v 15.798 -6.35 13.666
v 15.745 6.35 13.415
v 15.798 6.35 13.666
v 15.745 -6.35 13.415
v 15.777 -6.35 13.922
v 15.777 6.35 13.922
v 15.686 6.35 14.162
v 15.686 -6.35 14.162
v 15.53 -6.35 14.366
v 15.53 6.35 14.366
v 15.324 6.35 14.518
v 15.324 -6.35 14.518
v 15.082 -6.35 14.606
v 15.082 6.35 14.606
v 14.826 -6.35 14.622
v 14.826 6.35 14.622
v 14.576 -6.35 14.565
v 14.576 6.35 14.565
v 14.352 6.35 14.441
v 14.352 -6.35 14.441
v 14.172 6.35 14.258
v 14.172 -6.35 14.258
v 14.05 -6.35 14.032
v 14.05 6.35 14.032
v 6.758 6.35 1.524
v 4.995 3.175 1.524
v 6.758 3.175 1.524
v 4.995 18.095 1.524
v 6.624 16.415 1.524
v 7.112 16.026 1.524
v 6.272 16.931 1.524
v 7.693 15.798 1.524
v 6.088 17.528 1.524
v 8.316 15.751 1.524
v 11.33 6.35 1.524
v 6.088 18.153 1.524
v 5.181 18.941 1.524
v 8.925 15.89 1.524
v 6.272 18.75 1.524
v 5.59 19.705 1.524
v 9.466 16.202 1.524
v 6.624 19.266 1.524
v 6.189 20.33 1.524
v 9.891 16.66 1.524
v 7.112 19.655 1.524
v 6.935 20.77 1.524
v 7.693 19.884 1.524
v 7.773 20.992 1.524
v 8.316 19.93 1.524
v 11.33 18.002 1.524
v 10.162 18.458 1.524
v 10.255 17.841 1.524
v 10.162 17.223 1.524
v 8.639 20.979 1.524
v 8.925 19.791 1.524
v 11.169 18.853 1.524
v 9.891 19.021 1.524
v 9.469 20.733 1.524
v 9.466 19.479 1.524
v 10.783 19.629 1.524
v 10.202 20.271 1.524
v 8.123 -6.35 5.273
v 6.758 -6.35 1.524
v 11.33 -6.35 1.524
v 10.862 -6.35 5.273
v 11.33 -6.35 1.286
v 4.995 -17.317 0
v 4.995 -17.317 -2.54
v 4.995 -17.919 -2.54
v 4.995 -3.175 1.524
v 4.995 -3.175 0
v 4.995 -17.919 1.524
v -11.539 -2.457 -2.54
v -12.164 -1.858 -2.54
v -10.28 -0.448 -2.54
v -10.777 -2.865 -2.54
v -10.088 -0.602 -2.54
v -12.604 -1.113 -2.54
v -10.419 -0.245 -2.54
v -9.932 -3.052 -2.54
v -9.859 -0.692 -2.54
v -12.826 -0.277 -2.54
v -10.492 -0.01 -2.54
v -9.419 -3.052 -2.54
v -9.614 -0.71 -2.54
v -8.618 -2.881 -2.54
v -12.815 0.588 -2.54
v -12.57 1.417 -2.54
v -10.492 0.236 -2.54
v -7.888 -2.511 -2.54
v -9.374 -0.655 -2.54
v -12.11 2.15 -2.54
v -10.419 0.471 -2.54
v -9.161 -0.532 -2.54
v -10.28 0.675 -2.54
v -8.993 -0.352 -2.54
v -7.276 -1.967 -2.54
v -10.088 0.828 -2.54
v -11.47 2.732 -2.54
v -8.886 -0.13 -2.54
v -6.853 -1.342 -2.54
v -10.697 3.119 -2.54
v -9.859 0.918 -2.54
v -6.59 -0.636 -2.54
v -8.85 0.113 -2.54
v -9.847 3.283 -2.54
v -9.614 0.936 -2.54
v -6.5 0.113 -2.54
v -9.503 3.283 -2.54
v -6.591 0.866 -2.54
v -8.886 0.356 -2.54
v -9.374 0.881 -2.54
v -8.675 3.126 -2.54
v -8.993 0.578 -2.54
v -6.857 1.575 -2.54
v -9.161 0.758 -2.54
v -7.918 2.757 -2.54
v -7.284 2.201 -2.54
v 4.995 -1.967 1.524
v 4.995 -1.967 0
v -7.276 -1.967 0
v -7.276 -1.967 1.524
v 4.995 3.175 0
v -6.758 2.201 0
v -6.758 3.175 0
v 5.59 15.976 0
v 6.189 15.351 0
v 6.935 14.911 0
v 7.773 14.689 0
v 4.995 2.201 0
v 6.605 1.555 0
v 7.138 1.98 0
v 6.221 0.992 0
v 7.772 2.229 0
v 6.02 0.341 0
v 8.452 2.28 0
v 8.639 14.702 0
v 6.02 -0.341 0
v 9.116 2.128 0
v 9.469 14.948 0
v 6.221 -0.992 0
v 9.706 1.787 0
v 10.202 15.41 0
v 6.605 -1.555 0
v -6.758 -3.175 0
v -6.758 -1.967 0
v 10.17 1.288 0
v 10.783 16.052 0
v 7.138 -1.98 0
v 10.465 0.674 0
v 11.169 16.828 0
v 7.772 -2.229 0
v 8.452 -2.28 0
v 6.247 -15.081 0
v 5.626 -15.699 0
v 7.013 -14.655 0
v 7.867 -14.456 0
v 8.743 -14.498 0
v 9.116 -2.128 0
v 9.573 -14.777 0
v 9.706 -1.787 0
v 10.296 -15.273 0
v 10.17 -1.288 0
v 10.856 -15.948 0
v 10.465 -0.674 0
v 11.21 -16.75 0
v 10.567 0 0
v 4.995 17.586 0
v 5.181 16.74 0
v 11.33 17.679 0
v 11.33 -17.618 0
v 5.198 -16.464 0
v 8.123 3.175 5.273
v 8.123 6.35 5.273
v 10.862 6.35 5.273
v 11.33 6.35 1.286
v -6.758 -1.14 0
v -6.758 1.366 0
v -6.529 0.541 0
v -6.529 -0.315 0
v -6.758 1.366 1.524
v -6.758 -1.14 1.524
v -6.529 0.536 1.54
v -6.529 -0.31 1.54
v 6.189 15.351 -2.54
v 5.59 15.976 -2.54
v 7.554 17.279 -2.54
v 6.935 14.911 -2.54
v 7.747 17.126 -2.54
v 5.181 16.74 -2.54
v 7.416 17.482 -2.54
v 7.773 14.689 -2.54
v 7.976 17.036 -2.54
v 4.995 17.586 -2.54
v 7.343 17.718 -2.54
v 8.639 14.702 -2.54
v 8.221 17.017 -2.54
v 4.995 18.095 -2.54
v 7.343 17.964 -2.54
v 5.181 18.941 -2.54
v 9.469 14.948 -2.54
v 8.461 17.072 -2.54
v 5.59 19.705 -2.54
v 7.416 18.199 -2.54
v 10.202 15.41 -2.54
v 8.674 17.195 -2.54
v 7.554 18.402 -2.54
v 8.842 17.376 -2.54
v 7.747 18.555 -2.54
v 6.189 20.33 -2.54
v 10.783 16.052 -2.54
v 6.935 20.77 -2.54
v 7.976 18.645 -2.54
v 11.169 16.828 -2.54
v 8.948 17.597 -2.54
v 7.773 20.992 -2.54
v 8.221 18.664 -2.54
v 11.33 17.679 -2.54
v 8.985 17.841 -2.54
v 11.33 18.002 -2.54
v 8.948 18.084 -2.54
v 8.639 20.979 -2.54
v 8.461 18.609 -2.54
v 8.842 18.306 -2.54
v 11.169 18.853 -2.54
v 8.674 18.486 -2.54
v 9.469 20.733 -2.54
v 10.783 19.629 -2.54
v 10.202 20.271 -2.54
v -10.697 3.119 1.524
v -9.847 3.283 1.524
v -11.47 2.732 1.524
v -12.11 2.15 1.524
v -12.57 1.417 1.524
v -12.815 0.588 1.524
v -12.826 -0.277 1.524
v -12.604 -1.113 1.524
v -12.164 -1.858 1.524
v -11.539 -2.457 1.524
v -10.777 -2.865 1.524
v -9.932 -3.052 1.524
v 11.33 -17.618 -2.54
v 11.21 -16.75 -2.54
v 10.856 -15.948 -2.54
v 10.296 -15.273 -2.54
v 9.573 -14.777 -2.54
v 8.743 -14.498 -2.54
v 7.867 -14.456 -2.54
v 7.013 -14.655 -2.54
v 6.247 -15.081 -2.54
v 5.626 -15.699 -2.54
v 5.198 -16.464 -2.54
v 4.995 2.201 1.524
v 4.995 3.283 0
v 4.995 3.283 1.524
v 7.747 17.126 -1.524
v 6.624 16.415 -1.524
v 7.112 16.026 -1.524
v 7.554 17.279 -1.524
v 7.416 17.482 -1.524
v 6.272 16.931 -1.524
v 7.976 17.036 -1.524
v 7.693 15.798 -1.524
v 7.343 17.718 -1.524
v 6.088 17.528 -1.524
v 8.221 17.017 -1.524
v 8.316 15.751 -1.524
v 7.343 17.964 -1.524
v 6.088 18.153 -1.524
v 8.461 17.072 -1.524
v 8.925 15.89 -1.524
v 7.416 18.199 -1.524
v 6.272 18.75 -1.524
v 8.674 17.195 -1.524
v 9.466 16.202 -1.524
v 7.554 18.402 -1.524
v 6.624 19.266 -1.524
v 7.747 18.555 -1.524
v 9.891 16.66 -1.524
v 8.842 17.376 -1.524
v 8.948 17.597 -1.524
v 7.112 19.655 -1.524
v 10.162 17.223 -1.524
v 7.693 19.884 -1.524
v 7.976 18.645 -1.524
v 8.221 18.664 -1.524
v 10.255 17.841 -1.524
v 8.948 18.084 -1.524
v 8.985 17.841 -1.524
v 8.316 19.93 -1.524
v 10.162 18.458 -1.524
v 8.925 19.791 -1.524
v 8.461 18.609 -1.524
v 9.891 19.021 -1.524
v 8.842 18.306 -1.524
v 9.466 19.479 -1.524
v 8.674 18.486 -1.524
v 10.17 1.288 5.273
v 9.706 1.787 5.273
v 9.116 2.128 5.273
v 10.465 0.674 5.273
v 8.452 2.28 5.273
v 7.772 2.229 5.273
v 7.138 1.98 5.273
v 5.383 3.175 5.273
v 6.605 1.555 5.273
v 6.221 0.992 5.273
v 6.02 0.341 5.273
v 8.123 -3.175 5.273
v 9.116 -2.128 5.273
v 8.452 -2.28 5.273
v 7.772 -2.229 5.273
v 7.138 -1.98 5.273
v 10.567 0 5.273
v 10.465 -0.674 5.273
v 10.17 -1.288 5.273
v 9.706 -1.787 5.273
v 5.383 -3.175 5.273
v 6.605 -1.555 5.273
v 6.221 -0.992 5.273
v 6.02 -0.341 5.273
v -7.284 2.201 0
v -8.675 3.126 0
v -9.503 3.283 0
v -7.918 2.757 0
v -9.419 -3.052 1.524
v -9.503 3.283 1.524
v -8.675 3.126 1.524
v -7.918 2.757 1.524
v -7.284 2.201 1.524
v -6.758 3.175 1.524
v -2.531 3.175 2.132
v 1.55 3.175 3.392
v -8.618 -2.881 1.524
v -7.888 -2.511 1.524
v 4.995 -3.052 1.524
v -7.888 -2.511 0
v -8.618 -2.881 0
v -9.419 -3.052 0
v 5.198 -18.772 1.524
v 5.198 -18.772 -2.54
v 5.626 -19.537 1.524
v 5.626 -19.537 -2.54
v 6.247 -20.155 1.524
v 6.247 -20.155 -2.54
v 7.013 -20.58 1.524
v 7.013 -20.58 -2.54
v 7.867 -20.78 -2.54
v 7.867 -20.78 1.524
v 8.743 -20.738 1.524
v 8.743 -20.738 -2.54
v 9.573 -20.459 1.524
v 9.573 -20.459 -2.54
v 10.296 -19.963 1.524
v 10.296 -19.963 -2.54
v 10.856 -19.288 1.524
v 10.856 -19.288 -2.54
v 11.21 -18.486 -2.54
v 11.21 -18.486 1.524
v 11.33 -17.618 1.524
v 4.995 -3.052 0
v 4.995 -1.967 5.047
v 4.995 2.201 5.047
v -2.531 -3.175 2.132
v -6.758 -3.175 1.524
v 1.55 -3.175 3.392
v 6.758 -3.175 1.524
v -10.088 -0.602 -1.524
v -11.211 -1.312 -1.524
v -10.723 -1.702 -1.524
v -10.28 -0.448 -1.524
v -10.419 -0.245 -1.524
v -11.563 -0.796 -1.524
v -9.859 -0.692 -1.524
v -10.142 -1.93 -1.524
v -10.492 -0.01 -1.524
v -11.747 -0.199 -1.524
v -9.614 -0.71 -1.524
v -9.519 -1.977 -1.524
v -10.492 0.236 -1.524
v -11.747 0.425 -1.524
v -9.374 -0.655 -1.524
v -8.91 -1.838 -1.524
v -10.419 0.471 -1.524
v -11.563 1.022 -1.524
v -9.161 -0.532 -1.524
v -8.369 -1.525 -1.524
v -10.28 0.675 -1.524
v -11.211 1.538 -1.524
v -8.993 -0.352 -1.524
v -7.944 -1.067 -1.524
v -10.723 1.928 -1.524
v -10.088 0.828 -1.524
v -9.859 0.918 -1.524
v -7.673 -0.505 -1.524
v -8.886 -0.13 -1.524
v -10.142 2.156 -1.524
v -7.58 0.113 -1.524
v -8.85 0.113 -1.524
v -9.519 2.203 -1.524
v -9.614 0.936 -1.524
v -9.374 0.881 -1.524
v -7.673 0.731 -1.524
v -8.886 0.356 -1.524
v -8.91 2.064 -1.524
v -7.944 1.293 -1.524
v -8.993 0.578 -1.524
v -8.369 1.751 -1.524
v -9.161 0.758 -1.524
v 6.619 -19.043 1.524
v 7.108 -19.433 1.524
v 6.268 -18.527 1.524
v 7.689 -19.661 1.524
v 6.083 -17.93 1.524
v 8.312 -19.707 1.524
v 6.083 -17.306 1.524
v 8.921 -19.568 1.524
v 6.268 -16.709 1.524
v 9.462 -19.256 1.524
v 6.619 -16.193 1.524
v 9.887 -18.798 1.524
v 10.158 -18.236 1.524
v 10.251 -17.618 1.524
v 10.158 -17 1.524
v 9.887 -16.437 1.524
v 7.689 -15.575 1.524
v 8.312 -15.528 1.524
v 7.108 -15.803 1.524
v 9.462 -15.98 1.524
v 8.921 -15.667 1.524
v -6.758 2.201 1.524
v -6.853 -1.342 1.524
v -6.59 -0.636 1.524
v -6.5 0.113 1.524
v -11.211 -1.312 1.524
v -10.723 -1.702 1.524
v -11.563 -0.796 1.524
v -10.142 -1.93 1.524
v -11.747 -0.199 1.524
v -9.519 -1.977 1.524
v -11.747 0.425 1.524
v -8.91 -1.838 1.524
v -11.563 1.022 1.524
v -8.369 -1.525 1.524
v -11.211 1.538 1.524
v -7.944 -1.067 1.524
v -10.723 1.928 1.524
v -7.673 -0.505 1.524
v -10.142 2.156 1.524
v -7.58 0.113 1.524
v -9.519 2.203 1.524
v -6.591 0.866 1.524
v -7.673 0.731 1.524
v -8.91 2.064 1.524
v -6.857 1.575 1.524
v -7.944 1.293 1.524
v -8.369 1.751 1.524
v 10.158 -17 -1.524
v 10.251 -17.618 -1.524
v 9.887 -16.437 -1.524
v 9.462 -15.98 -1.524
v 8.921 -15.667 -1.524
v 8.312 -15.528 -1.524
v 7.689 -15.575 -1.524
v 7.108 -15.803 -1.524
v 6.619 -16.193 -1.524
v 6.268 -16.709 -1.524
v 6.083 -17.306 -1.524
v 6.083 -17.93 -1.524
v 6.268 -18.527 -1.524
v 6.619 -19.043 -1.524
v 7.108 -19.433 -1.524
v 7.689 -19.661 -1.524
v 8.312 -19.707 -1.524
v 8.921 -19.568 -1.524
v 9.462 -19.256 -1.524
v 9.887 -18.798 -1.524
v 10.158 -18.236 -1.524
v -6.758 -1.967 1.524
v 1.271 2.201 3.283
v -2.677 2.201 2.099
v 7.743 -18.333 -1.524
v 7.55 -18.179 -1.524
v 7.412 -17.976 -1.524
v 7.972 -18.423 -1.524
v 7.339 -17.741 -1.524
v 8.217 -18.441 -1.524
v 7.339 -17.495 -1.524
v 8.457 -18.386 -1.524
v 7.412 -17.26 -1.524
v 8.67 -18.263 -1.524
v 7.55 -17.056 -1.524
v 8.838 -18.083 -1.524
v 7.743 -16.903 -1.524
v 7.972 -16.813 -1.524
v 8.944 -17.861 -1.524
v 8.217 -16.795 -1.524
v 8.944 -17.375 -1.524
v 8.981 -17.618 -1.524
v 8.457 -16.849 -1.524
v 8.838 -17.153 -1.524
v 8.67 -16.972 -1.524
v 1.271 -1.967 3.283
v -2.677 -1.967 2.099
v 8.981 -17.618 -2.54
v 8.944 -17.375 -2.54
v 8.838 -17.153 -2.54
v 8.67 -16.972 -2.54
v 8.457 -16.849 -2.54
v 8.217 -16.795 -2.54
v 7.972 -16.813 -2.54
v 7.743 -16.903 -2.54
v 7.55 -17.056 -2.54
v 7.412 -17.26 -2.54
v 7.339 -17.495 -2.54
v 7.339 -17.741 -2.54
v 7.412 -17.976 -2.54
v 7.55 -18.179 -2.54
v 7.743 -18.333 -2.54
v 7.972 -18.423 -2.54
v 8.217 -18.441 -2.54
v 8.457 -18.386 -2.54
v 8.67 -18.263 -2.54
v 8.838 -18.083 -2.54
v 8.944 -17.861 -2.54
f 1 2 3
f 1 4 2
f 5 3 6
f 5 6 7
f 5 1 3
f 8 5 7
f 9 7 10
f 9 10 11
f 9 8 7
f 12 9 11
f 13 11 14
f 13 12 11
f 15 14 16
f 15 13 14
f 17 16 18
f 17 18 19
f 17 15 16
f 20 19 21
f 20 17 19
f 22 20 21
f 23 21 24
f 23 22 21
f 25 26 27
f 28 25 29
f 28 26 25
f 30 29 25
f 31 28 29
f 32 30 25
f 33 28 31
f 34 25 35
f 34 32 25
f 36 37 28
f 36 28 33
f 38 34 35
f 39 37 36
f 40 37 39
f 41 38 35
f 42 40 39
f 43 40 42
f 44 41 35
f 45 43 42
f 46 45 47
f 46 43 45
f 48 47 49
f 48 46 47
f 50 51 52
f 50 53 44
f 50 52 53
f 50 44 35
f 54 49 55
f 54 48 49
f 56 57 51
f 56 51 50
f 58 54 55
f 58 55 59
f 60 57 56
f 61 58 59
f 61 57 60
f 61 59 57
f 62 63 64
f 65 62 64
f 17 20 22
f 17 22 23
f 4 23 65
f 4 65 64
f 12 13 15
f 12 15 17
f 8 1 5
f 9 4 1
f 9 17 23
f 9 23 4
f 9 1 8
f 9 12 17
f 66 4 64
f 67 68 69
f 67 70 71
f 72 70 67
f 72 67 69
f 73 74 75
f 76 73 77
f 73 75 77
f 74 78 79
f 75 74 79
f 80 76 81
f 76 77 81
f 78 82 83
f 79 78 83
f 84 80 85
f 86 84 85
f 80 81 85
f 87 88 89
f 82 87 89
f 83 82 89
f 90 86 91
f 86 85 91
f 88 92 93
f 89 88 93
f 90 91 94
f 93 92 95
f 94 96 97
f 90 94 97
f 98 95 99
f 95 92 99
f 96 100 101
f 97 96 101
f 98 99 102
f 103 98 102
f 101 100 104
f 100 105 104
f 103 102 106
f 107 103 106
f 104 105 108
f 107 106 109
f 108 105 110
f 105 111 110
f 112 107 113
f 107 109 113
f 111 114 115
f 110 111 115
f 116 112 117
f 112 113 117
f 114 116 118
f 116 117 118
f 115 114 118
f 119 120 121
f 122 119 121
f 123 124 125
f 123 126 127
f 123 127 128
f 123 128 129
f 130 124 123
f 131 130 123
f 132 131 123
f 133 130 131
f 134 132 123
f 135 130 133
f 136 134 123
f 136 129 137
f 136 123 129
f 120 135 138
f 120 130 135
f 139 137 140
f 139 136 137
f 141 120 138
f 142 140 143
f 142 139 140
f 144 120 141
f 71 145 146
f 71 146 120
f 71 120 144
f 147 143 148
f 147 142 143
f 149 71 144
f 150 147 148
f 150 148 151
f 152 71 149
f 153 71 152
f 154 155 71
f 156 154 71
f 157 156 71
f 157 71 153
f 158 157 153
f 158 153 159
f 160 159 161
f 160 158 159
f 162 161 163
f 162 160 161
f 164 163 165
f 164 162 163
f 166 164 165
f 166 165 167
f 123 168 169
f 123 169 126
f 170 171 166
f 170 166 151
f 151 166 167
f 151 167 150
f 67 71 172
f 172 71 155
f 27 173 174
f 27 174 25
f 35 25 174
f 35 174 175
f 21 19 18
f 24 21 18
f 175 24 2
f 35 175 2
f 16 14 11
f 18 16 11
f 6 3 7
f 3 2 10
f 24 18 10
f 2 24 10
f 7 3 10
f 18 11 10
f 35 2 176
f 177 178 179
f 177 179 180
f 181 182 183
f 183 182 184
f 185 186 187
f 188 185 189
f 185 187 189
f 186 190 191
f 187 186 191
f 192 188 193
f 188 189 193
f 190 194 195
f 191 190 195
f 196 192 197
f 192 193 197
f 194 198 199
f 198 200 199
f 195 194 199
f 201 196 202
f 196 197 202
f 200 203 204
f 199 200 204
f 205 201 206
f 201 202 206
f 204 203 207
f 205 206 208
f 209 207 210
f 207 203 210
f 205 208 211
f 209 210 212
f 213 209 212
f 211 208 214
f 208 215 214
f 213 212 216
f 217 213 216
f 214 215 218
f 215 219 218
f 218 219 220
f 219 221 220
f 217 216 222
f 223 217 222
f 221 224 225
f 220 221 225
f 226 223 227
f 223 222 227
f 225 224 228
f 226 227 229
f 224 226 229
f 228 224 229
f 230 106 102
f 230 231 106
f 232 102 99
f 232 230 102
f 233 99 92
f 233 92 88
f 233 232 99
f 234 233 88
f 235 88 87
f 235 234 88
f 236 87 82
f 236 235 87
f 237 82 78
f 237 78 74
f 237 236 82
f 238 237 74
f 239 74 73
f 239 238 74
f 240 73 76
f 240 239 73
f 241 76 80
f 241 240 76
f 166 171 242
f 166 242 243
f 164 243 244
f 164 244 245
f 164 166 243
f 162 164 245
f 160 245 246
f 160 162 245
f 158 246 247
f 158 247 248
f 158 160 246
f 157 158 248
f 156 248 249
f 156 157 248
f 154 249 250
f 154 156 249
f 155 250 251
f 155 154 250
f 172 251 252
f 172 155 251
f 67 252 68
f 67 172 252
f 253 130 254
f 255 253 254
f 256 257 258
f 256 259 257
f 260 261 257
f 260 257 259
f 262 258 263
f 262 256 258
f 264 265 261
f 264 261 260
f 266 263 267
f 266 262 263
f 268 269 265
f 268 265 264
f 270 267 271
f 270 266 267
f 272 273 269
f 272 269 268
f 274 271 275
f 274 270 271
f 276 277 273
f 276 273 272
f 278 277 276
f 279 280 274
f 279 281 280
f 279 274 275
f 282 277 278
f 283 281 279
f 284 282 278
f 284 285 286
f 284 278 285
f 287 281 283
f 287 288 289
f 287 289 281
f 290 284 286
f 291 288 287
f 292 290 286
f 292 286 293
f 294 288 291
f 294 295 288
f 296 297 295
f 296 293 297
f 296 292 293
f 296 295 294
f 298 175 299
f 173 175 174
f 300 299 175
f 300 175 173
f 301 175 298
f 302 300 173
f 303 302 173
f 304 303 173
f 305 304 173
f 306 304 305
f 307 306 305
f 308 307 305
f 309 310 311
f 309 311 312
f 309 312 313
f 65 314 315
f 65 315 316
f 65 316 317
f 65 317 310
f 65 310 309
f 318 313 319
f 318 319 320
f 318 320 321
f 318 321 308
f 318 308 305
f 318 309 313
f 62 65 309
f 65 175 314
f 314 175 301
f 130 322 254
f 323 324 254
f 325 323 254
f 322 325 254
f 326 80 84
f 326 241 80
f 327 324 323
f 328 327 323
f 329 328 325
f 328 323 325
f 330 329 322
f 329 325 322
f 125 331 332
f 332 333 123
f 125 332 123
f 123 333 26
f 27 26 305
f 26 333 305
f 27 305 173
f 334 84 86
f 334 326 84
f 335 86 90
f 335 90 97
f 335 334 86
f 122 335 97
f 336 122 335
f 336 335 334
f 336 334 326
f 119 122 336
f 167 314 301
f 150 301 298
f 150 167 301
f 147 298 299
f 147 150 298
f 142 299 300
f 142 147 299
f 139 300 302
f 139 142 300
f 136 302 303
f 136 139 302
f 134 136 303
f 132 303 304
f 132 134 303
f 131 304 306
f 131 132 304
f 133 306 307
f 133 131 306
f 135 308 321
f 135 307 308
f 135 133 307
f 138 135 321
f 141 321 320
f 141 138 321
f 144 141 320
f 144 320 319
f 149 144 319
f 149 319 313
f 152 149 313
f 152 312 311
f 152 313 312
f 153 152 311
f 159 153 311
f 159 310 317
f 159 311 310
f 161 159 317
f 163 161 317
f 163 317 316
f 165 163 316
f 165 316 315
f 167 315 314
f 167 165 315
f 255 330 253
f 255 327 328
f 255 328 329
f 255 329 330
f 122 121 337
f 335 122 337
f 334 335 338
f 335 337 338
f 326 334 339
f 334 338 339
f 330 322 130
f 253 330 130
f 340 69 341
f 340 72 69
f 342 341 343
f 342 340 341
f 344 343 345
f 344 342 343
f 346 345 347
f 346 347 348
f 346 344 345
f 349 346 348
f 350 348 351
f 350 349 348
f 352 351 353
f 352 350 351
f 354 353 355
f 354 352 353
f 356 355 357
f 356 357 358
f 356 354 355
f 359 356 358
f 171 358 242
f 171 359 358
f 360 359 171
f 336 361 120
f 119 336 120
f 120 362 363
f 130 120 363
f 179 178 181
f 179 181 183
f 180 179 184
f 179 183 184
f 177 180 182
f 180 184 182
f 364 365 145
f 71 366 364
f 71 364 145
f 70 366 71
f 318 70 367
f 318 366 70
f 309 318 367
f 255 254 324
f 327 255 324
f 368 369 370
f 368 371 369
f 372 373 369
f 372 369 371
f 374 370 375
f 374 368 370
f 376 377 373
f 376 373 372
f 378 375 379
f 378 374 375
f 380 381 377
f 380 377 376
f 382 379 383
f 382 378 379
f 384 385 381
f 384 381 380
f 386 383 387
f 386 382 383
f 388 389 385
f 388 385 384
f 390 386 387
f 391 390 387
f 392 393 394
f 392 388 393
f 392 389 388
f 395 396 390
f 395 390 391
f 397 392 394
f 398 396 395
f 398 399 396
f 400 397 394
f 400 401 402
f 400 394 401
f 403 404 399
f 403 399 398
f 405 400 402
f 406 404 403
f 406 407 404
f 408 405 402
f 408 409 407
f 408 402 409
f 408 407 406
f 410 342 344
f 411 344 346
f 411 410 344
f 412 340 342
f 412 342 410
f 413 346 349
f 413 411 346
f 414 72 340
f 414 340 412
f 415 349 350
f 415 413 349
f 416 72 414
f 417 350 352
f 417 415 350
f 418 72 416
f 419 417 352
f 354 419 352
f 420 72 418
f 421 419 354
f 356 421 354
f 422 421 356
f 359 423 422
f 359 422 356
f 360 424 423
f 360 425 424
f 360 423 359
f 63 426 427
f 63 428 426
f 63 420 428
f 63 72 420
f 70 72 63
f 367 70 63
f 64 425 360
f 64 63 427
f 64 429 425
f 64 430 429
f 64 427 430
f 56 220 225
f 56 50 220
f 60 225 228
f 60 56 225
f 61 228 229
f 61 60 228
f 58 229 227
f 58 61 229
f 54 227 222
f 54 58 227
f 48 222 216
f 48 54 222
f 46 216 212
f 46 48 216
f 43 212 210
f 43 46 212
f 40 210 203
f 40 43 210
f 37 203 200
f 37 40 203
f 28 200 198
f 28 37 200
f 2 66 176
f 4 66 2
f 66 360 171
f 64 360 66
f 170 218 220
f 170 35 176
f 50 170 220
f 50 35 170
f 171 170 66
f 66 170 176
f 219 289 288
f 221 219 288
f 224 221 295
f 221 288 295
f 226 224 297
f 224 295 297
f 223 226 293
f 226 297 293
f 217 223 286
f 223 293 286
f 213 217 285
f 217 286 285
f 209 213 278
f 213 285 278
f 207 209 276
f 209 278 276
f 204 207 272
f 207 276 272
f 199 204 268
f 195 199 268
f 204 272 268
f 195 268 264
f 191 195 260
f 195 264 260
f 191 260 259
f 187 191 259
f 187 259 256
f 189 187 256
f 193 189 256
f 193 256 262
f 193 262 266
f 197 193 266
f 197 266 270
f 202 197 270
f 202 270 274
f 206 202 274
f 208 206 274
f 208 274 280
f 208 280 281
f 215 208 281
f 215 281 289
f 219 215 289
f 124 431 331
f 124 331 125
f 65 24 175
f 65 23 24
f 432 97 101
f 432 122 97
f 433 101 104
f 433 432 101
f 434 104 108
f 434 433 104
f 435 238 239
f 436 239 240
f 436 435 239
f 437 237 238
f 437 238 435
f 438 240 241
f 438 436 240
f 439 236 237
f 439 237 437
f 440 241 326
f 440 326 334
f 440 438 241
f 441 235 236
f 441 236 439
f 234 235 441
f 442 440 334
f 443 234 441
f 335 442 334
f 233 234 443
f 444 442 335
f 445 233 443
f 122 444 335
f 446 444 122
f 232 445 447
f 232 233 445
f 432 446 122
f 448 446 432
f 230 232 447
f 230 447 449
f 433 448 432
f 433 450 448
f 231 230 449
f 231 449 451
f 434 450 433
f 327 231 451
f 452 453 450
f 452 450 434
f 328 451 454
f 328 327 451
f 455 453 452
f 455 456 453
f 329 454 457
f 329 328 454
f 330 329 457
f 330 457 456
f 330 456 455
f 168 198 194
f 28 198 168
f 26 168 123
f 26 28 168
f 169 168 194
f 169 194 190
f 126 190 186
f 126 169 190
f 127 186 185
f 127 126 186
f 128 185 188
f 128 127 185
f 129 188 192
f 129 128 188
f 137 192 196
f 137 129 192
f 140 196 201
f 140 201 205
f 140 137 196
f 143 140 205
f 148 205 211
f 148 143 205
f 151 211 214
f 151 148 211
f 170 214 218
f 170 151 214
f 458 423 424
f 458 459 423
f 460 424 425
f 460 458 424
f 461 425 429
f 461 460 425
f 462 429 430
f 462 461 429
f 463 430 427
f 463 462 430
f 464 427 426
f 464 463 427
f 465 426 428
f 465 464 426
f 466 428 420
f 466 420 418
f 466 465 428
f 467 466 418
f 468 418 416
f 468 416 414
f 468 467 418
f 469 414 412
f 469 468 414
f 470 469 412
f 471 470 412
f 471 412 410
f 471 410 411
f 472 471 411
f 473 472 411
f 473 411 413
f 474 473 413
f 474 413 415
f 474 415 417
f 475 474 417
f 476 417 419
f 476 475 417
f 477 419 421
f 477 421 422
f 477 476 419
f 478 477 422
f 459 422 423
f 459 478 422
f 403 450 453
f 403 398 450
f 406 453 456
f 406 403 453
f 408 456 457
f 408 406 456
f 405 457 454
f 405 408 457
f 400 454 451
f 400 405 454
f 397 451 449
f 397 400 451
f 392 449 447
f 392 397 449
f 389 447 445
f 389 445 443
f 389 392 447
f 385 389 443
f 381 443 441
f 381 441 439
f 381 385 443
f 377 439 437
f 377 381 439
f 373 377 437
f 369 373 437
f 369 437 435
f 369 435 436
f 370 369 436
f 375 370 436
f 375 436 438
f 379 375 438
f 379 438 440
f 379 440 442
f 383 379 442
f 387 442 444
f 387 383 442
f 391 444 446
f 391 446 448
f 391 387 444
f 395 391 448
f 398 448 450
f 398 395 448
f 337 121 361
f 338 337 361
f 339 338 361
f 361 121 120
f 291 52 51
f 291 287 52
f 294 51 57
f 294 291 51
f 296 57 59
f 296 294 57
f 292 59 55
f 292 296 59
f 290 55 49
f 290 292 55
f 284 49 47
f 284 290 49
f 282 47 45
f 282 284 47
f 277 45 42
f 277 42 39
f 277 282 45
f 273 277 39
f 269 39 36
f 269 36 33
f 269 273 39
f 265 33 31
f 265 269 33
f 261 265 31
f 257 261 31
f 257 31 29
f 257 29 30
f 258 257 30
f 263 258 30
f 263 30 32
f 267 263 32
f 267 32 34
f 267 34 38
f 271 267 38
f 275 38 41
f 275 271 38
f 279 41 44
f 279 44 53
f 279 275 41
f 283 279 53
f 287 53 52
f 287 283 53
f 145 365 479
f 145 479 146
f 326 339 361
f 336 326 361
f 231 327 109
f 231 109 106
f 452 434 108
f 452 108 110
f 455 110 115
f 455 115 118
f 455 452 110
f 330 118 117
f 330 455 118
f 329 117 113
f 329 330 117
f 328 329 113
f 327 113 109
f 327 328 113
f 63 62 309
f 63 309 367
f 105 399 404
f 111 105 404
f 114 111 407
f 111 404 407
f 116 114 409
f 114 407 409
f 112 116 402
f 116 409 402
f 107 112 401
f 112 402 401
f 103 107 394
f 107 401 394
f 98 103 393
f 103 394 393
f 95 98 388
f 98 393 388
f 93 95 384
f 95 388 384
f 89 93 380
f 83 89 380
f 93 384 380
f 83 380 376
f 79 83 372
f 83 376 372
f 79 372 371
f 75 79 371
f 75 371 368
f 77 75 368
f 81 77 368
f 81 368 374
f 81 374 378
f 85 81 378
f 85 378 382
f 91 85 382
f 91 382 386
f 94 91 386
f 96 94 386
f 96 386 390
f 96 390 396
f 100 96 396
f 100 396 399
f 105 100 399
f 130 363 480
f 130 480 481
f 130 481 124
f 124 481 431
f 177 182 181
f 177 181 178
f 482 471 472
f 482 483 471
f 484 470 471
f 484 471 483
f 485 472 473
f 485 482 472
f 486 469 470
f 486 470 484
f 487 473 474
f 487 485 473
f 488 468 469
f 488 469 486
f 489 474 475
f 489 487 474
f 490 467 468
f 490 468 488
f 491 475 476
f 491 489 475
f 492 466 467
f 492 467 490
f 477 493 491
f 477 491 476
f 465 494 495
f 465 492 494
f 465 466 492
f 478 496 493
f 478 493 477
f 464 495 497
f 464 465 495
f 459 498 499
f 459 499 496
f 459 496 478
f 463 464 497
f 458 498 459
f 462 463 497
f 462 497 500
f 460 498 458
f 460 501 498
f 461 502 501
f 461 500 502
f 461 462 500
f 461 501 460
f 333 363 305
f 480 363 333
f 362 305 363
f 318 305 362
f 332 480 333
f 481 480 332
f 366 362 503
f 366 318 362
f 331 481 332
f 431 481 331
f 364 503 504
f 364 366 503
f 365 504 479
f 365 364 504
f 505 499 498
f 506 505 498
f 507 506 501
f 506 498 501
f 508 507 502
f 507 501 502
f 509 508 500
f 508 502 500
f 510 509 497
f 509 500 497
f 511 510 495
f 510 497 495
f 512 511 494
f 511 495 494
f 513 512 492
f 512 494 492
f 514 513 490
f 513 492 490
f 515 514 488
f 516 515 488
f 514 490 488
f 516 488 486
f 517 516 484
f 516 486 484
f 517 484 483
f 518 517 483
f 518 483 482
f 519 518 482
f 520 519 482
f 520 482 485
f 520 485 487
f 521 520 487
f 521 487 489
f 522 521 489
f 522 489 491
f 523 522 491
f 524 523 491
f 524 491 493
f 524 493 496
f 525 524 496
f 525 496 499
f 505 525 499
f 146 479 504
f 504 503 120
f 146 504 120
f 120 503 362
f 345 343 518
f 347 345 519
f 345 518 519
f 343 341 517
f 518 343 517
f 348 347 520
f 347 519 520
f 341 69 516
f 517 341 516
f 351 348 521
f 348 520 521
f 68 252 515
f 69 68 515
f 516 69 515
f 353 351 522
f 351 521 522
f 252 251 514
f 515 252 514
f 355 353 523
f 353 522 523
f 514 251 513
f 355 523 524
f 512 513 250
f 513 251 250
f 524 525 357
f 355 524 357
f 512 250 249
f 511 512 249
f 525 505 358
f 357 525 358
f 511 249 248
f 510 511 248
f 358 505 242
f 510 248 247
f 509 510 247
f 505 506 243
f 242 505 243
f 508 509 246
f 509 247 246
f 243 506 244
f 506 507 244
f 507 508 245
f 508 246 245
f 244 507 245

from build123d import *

# Parameters (mm, degrees)
F0_R      = 2.286
F0_R_2    = 2.0955
F2_DEPTH  = 1.524
F3_DEPTH  = 6.35
F4_DEPTH  = 3.175
F5_DEPTH  = 1.524
F6_DEPTH  = 12.7
F0_R_3    = 0.8255
F7_DEPTH  = 2.54
F8_DEPTH  = 1.524
F9_DEPTH  = 2.54
F10_DEPTH = 1.524
F11_DEPTH = 2.54
F12_DEPTH = 1.524
F13_DEPTH = 25.4


with BuildPart() as f2:
    # F0 (on Top) → F2 (new body)
    with BuildSketch(Plane.XY):
        with BuildLine():
            Line((4.9948175588, 3.2833689949), (4.9948175588, 2.2014643259))
            Line((4.9948175588, 2.2014643259), (4.9948175588, -1.9667148894))
            Line((4.9948175588, -1.9667148894), (4.9948175588, -3.0515958757))
            Line((4.9948175588, -3.0515958757), (4.9948175588, -17.3166585326))
            ThreePointArc((4.9948175588, -17.3166585326), (8.3062650536, -14.4464316119), (11.3304992405, -17.6178500122))
            Line((11.3304992405, -17.6178500122), (11.3304992405, 17.6788508391))
            ThreePointArc((11.3304992405, 17.6788508391), (8.2060050581, 14.6658888438), (4.9948175588, 17.5862790105))
            Line((4.9948175588, 17.5862790105), (4.9948175588, 3.2833689949))
        make_face()
        with Locations((8.2809459418, 0)):
            Circle(F0_R, mode=Mode.SUBTRACT)
        with BuildLine():
            Line((4.9948175588, 18.0948209651), (4.9948175588, 17.5862790105))
            ThreePointArc((4.9948175588, 17.5862790105), (8.2060050581, 14.6658888438), (11.3304992405, 17.6788508391))
            Line((11.3304992405, 17.6788508391), (11.3304992405, 18.0022491365))
            ThreePointArc((11.3304992405, 18.0022491365), (8.2060050581, 21.0152111318), (4.9948175588, 18.0948209651))
        make_face()
        with Locations((8.1596194911, 17.8405499878)):
            Circle(F0_R_2, mode=Mode.SUBTRACT)
        with BuildLine():
            ThreePointArc((11.3304992405, -17.6178500122), (8.3062650536, -14.4464316119), (4.9948175588, -17.3166585326))
            Line((4.9948175588, -17.3166585326), (4.9948175588, -17.9190414918))
            ThreePointArc((4.9948175588, -17.9190414918), (8.3062650536, -20.7892684125), (11.3304992405, -17.6178500122))
        make_face()
        with Locations((8.1554992405, -17.6178500122)):
            Circle(F0_R_2, mode=Mode.SUBTRACT)
    extrude(amount=F2_DEPTH)

    # F1 (on Front) → F3 (join, symmetric)
    with BuildSketch(Plane.XZ):
        with BuildLine():
            Line((10.8624471896, 5.2727888553), (8.1229047444, 5.2727888553))
            Line((8.1229047444, 5.2727888553), (6.2037665495, 0))
            Line((6.2037665495, 0), (10.8624471896, 0))
            Line((10.8624471896, 0), (15.7450092285, 13.4147289508))
            ThreePointArc((15.7450092285, 13.4147289508), (15.2060879556, 14.5704493502), (14.0503675562, 14.0315280773))
            Line((14.0503675562, 14.0315280773), (10.8624471896, 5.2727888553))
        make_face()
    extrude(amount=F3_DEPTH, both=True)

    # F1 (on Front) → F4 (join, symmetric)
    with BuildSketch(Plane.XZ):
        with BuildLine():
            Line((8.1229047444, 5.2727888553), (5.3833622992, 5.2727888553))
            ThreePointArc((5.3833622992, 5.2727888553), (-0.4659601575, 2.6817210776), (-6.7578507587, 1.524))
            Line((-6.7578507587, 1.524), (-6.7578507587, 0))
            Line((-6.7578507587, 0), (5.0566992405, 0))
            Line((5.0566992405, 0), (6.2037665495, 0))
            Line((6.2037665495, 0), (8.1229047444, 5.2727888553))
        make_face()
    extrude(amount=F4_DEPTH, both=True)

    # F0 (on Top) → F6 (cut, symmetric)
    with BuildSketch(Plane.XY):
        with BuildLine():
            ThreePointArc((-7.2838490429, 2.2014643259), (-6.7026349357, 1.2283188177), (-6.5003007595, 0.1130238343))
            ThreePointArc((-6.5003007595, 0.1130238343), (-6.7006139401, -0.9968695509), (-7.2762776581, -1.9667148894))
            Line((-7.2762776581, -1.9667148894), (4.9948175588, -1.9667148894))
            Line((4.9948175588, -1.9667148894), (4.9948175588, 2.2014643259))
            Line((4.9948175588, 2.2014643259), (-7.2838490429, 2.2014643259))
        make_face()
    extrude(amount=F6_DEPTH, both=True, mode=Mode.SUBTRACT)

    # F0 (on Top) → F7 (join)
    with BuildSketch(Plane.XY):
        with BuildLine():
            ThreePointArc((11.3304992405, -17.6178500122), (8.3062650536, -14.4464316119), (4.9948175588, -17.3166585326))
            Line((4.9948175588, -17.3166585326), (4.9948175588, -17.9190414918))
            ThreePointArc((4.9948175588, -17.9190414918), (8.3062650536, -20.7892684125), (11.3304992405, -17.6178500122))
        make_face()
        with Locations((8.1554992405, -17.6178500122)):
            Circle(F0_R_2, mode=Mode.SUBTRACT)
        with Locations((8.1554992405, -17.6178500122)):
            Circle(F0_R_2)
        with Locations((8.1554992405, -17.6178500122)):
            Circle(F0_R_3, mode=Mode.SUBTRACT)
    extrude(amount=-F7_DEPTH)

    # F0 (on Top) → F8 (cut)
    with BuildSketch(Plane.XY):
        with Locations((8.1554992405, -17.6178500122)):
            Circle(F0_R_2)
        with Locations((8.1554992405, -17.6178500122)):
            Circle(F0_R_3, mode=Mode.SUBTRACT)
    extrude(amount=-F8_DEPTH, mode=Mode.SUBTRACT)

    # F0 (on Top) → F11 (join)
    with BuildSketch(Plane.XY):
        with BuildLine():
            Line((4.9948175588, 18.0948209651), (4.9948175588, 17.5862790105))
            ThreePointArc((4.9948175588, 17.5862790105), (8.2060050581, 14.6658888438), (11.3304992405, 17.6788508391))
            Line((11.3304992405, 17.6788508391), (11.3304992405, 18.0022491365))
            ThreePointArc((11.3304992405, 18.0022491365), (8.2060050581, 21.0152111318), (4.9948175588, 18.0948209651))
        make_face()
        with Locations((8.1596194911, 17.8405499878)):
            Circle(F0_R_2, mode=Mode.SUBTRACT)
        with Locations((8.1596194911, 17.8405499878)):
            Circle(F0_R_2)
        with Locations((8.1596194911, 17.8405499878)):
            Circle(F0_R_3, mode=Mode.SUBTRACT)
    extrude(amount=-F11_DEPTH)

    # F0 (on Top) → F12 (cut)
    with BuildSketch(Plane.XY):
        with Locations((8.1596194911, 17.8405499878)):
            Circle(F0_R_2)
        with Locations((8.1596194911, 17.8405499878)):
            Circle(F0_R_3, mode=Mode.SUBTRACT)
    extrude(amount=-F12_DEPTH, mode=Mode.SUBTRACT)

    # F0 (on Top) → F13 (cut)
    with BuildSketch(Plane.XY):
        with Locations((8.2809459418, 0)):
            Circle(F0_R)
    extrude(amount=F13_DEPTH, mode=Mode.SUBTRACT)


with BuildPart() as f2b:
    # F0 (on Top) → F2, piece 2 (new body)
    with BuildSketch(Plane.XY):
        with BuildLine():
            ThreePointArc((-7.2762776581, -1.9667148894), (-6.7006139401, -0.9968695509), (-6.5003007595, 0.1130238343))
            ThreePointArc((-6.5003007595, 0.1130238343), (-6.7026349357, 1.2283188177), (-7.2838490429, 2.2014643259))
            ThreePointArc((-7.2838490429, 2.2014643259), (-8.2841595771, 2.9670300029), (-9.5034387136, 3.2833689949))
            Line((-9.5034387136, 3.2833689949), (-9.8471628054, 3.2833689949))
            ThreePointArc((-9.8471628054, 3.2833689949), (-12.8500172326, 0.1554539585), (-9.9318296879, -3.0515958757))
            Line((-9.9318296879, -3.0515958757), (-9.4187718311, -3.0515958757))
            ThreePointArc((-9.4187718311, -3.0515958757), (-8.2409957591, -2.7195358148), (-7.2762776581, -1.9667148894))
        make_face()
        with Locations((-9.6753007595, 0.1130238343)):
            Circle(F0_R_2, mode=Mode.SUBTRACT)
    extrude(amount=F2_DEPTH)

    # F0 (on Top) → F9 (join)
    with BuildSketch(Plane.XY):
        with BuildLine():
            ThreePointArc((-7.2762776581, -1.9667148894), (-6.7006139401, -0.9968695509), (-6.5003007595, 0.1130238343))
            ThreePointArc((-6.5003007595, 0.1130238343), (-6.7026349357, 1.2283188177), (-7.2838490429, 2.2014643259))
            ThreePointArc((-7.2838490429, 2.2014643259), (-8.2841595771, 2.9670300029), (-9.5034387136, 3.2833689949))
            Line((-9.5034387136, 3.2833689949), (-9.8471628054, 3.2833689949))
            ThreePointArc((-9.8471628054, 3.2833689949), (-12.8500172326, 0.1554539585), (-9.9318296879, -3.0515958757))
            Line((-9.9318296879, -3.0515958757), (-9.4187718311, -3.0515958757))
            ThreePointArc((-9.4187718311, -3.0515958757), (-8.2409957591, -2.7195358148), (-7.2762776581, -1.9667148894))
        make_face()
        with Locations((-9.6753007595, 0.1130238343)):
            Circle(F0_R_2, mode=Mode.SUBTRACT)
        with Locations((-9.6753007595, 0.1130238343)):
            Circle(F0_R_2)
        with Locations((-9.6753007595, 0.1130238343)):
            Circle(F0_R_3, mode=Mode.SUBTRACT)
    extrude(amount=-F9_DEPTH)

    # F0 (on Top) → F10 (cut)
    with BuildSketch(Plane.XY):
        with Locations((-9.6753007595, 0.1130238343)):
            Circle(F0_R_2)
        with Locations((-9.6753007595, 0.1130238343)):
            Circle(F0_R_3, mode=Mode.SUBTRACT)
    extrude(amount=-F10_DEPTH, mode=Mode.SUBTRACT)


with BuildPart() as f5:
    # F0 (on Top) → F5 (new body)
    with BuildSketch(Plane.XY):
        with BuildLine():
            ThreePointArc((-9.5034387136, 3.2833689949), (-8.2841595771, 2.9670300029), (-7.2838490429, 2.2014643259))
            Line((-7.2838490429, 2.2014643259), (4.9948175588, 2.2014643259))
            Line((4.9948175588, 2.2014643259), (4.9948175588, 3.2833689949))
            Line((4.9948175588, 3.2833689949), (-9.5034387136, 3.2833689949))
        make_face()
    extrude(amount=F5_DEPTH)


with BuildPart() as f5b:
    # F0 (on Top) → F5, piece 2 (new body)
    with BuildSketch(Plane.XY):
        with BuildLine():
            Line((4.9948175588, -1.9667148894), (-7.2762776581, -1.9667148894))
            ThreePointArc((-7.2762776581, -1.9667148894), (-8.2409957591, -2.7195358148), (-9.4187718311, -3.0515958757))
            Line((-9.4187718311, -3.0515958757), (4.9948175588, -3.0515958757))
            Line((4.9948175588, -3.0515958757), (4.9948175588, -1.9667148894))
        make_face()
    extrude(amount=F5_DEPTH)


solid = Compound([f2.part, f2b.part, f5.part, f5b.part])
